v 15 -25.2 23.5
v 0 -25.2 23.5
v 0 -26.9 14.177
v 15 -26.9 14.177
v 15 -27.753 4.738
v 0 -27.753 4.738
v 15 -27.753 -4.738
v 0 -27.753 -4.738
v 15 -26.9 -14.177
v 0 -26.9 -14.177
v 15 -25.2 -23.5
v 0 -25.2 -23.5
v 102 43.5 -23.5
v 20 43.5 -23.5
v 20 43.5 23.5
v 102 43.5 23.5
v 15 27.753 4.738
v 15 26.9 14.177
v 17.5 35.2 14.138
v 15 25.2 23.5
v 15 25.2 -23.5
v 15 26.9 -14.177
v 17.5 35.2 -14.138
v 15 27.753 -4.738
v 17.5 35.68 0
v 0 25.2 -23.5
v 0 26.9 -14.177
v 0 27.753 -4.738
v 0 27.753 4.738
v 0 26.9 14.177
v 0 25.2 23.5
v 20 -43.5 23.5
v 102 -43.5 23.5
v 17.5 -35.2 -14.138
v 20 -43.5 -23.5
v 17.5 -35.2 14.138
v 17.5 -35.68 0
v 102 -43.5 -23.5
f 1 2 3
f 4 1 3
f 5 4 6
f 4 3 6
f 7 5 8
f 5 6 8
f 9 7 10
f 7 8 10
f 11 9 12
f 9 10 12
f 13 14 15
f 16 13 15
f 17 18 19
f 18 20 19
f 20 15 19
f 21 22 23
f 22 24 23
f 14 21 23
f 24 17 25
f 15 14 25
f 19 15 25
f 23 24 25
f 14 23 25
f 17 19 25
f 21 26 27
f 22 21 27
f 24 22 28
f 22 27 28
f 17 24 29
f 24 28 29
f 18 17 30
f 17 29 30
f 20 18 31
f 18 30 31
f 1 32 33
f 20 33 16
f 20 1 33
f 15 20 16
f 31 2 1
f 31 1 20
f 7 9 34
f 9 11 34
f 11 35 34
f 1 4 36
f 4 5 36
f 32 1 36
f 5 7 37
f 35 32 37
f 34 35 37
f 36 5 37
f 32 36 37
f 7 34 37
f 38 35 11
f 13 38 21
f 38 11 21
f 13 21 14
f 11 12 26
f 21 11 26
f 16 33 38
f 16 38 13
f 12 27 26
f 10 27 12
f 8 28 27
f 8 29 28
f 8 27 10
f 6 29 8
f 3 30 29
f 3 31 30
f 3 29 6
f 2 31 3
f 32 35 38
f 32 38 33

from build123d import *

# Parameters (mm, degrees)
PAD002_DEPTH = 15
SKETCH005_W  = 87
SKETCH005_H  = 47
SKETCH007_W  = 87
SKETCH007_H  = 47
PAD003_DEPTH = 82


with BuildPart() as part:
    # Sketch004 → Pad002 (new body)
    with BuildSketch(Plane.YZ):
        with BuildLine():
            Line((-25.2, 23.5), (25.2, 23.5))
            ThreePointArc((25.2, -23.5), (27.86, 0), (25.2, 23.5))
            Line((25.2, -23.5), (-25.2, -23.5))
            ThreePointArc((-25.2, 23.5), (-27.86, 0), (-25.2, -23.5))
        make_face()
    extrude(amount=PAD002_DEPTH)

    # Sketch006 (on Face6 of Pad002) → AdditiveLoft001 section 0
    with BuildSketch(Plane.YZ.offset(15)):
        with BuildLine():
            Line((-25.2, 23.5), (25.2, 23.5))
            ThreePointArc((25.2, -23.5), (27.86, 0), (25.2, 23.5))
            Line((-25.2, -23.5), (25.2, -23.5))
            ThreePointArc((-25.2, 23.5), (-27.86, 0), (-25.2, -23.5))
        make_face()
    # Sketch005 → AdditiveLoft001 section 1
    with BuildSketch(Plane.YZ.offset(20)):
        Rectangle(SKETCH005_W, SKETCH005_H)
    loft()

    # Sketch007 (on Face10 of AdditiveLoft001) → Pad003 (join)
    with BuildSketch(Plane.YZ.offset(20)):
        Rectangle(SKETCH007_W, SKETCH007_H)
    extrude(amount=PAD003_DEPTH)


solid = part.part
